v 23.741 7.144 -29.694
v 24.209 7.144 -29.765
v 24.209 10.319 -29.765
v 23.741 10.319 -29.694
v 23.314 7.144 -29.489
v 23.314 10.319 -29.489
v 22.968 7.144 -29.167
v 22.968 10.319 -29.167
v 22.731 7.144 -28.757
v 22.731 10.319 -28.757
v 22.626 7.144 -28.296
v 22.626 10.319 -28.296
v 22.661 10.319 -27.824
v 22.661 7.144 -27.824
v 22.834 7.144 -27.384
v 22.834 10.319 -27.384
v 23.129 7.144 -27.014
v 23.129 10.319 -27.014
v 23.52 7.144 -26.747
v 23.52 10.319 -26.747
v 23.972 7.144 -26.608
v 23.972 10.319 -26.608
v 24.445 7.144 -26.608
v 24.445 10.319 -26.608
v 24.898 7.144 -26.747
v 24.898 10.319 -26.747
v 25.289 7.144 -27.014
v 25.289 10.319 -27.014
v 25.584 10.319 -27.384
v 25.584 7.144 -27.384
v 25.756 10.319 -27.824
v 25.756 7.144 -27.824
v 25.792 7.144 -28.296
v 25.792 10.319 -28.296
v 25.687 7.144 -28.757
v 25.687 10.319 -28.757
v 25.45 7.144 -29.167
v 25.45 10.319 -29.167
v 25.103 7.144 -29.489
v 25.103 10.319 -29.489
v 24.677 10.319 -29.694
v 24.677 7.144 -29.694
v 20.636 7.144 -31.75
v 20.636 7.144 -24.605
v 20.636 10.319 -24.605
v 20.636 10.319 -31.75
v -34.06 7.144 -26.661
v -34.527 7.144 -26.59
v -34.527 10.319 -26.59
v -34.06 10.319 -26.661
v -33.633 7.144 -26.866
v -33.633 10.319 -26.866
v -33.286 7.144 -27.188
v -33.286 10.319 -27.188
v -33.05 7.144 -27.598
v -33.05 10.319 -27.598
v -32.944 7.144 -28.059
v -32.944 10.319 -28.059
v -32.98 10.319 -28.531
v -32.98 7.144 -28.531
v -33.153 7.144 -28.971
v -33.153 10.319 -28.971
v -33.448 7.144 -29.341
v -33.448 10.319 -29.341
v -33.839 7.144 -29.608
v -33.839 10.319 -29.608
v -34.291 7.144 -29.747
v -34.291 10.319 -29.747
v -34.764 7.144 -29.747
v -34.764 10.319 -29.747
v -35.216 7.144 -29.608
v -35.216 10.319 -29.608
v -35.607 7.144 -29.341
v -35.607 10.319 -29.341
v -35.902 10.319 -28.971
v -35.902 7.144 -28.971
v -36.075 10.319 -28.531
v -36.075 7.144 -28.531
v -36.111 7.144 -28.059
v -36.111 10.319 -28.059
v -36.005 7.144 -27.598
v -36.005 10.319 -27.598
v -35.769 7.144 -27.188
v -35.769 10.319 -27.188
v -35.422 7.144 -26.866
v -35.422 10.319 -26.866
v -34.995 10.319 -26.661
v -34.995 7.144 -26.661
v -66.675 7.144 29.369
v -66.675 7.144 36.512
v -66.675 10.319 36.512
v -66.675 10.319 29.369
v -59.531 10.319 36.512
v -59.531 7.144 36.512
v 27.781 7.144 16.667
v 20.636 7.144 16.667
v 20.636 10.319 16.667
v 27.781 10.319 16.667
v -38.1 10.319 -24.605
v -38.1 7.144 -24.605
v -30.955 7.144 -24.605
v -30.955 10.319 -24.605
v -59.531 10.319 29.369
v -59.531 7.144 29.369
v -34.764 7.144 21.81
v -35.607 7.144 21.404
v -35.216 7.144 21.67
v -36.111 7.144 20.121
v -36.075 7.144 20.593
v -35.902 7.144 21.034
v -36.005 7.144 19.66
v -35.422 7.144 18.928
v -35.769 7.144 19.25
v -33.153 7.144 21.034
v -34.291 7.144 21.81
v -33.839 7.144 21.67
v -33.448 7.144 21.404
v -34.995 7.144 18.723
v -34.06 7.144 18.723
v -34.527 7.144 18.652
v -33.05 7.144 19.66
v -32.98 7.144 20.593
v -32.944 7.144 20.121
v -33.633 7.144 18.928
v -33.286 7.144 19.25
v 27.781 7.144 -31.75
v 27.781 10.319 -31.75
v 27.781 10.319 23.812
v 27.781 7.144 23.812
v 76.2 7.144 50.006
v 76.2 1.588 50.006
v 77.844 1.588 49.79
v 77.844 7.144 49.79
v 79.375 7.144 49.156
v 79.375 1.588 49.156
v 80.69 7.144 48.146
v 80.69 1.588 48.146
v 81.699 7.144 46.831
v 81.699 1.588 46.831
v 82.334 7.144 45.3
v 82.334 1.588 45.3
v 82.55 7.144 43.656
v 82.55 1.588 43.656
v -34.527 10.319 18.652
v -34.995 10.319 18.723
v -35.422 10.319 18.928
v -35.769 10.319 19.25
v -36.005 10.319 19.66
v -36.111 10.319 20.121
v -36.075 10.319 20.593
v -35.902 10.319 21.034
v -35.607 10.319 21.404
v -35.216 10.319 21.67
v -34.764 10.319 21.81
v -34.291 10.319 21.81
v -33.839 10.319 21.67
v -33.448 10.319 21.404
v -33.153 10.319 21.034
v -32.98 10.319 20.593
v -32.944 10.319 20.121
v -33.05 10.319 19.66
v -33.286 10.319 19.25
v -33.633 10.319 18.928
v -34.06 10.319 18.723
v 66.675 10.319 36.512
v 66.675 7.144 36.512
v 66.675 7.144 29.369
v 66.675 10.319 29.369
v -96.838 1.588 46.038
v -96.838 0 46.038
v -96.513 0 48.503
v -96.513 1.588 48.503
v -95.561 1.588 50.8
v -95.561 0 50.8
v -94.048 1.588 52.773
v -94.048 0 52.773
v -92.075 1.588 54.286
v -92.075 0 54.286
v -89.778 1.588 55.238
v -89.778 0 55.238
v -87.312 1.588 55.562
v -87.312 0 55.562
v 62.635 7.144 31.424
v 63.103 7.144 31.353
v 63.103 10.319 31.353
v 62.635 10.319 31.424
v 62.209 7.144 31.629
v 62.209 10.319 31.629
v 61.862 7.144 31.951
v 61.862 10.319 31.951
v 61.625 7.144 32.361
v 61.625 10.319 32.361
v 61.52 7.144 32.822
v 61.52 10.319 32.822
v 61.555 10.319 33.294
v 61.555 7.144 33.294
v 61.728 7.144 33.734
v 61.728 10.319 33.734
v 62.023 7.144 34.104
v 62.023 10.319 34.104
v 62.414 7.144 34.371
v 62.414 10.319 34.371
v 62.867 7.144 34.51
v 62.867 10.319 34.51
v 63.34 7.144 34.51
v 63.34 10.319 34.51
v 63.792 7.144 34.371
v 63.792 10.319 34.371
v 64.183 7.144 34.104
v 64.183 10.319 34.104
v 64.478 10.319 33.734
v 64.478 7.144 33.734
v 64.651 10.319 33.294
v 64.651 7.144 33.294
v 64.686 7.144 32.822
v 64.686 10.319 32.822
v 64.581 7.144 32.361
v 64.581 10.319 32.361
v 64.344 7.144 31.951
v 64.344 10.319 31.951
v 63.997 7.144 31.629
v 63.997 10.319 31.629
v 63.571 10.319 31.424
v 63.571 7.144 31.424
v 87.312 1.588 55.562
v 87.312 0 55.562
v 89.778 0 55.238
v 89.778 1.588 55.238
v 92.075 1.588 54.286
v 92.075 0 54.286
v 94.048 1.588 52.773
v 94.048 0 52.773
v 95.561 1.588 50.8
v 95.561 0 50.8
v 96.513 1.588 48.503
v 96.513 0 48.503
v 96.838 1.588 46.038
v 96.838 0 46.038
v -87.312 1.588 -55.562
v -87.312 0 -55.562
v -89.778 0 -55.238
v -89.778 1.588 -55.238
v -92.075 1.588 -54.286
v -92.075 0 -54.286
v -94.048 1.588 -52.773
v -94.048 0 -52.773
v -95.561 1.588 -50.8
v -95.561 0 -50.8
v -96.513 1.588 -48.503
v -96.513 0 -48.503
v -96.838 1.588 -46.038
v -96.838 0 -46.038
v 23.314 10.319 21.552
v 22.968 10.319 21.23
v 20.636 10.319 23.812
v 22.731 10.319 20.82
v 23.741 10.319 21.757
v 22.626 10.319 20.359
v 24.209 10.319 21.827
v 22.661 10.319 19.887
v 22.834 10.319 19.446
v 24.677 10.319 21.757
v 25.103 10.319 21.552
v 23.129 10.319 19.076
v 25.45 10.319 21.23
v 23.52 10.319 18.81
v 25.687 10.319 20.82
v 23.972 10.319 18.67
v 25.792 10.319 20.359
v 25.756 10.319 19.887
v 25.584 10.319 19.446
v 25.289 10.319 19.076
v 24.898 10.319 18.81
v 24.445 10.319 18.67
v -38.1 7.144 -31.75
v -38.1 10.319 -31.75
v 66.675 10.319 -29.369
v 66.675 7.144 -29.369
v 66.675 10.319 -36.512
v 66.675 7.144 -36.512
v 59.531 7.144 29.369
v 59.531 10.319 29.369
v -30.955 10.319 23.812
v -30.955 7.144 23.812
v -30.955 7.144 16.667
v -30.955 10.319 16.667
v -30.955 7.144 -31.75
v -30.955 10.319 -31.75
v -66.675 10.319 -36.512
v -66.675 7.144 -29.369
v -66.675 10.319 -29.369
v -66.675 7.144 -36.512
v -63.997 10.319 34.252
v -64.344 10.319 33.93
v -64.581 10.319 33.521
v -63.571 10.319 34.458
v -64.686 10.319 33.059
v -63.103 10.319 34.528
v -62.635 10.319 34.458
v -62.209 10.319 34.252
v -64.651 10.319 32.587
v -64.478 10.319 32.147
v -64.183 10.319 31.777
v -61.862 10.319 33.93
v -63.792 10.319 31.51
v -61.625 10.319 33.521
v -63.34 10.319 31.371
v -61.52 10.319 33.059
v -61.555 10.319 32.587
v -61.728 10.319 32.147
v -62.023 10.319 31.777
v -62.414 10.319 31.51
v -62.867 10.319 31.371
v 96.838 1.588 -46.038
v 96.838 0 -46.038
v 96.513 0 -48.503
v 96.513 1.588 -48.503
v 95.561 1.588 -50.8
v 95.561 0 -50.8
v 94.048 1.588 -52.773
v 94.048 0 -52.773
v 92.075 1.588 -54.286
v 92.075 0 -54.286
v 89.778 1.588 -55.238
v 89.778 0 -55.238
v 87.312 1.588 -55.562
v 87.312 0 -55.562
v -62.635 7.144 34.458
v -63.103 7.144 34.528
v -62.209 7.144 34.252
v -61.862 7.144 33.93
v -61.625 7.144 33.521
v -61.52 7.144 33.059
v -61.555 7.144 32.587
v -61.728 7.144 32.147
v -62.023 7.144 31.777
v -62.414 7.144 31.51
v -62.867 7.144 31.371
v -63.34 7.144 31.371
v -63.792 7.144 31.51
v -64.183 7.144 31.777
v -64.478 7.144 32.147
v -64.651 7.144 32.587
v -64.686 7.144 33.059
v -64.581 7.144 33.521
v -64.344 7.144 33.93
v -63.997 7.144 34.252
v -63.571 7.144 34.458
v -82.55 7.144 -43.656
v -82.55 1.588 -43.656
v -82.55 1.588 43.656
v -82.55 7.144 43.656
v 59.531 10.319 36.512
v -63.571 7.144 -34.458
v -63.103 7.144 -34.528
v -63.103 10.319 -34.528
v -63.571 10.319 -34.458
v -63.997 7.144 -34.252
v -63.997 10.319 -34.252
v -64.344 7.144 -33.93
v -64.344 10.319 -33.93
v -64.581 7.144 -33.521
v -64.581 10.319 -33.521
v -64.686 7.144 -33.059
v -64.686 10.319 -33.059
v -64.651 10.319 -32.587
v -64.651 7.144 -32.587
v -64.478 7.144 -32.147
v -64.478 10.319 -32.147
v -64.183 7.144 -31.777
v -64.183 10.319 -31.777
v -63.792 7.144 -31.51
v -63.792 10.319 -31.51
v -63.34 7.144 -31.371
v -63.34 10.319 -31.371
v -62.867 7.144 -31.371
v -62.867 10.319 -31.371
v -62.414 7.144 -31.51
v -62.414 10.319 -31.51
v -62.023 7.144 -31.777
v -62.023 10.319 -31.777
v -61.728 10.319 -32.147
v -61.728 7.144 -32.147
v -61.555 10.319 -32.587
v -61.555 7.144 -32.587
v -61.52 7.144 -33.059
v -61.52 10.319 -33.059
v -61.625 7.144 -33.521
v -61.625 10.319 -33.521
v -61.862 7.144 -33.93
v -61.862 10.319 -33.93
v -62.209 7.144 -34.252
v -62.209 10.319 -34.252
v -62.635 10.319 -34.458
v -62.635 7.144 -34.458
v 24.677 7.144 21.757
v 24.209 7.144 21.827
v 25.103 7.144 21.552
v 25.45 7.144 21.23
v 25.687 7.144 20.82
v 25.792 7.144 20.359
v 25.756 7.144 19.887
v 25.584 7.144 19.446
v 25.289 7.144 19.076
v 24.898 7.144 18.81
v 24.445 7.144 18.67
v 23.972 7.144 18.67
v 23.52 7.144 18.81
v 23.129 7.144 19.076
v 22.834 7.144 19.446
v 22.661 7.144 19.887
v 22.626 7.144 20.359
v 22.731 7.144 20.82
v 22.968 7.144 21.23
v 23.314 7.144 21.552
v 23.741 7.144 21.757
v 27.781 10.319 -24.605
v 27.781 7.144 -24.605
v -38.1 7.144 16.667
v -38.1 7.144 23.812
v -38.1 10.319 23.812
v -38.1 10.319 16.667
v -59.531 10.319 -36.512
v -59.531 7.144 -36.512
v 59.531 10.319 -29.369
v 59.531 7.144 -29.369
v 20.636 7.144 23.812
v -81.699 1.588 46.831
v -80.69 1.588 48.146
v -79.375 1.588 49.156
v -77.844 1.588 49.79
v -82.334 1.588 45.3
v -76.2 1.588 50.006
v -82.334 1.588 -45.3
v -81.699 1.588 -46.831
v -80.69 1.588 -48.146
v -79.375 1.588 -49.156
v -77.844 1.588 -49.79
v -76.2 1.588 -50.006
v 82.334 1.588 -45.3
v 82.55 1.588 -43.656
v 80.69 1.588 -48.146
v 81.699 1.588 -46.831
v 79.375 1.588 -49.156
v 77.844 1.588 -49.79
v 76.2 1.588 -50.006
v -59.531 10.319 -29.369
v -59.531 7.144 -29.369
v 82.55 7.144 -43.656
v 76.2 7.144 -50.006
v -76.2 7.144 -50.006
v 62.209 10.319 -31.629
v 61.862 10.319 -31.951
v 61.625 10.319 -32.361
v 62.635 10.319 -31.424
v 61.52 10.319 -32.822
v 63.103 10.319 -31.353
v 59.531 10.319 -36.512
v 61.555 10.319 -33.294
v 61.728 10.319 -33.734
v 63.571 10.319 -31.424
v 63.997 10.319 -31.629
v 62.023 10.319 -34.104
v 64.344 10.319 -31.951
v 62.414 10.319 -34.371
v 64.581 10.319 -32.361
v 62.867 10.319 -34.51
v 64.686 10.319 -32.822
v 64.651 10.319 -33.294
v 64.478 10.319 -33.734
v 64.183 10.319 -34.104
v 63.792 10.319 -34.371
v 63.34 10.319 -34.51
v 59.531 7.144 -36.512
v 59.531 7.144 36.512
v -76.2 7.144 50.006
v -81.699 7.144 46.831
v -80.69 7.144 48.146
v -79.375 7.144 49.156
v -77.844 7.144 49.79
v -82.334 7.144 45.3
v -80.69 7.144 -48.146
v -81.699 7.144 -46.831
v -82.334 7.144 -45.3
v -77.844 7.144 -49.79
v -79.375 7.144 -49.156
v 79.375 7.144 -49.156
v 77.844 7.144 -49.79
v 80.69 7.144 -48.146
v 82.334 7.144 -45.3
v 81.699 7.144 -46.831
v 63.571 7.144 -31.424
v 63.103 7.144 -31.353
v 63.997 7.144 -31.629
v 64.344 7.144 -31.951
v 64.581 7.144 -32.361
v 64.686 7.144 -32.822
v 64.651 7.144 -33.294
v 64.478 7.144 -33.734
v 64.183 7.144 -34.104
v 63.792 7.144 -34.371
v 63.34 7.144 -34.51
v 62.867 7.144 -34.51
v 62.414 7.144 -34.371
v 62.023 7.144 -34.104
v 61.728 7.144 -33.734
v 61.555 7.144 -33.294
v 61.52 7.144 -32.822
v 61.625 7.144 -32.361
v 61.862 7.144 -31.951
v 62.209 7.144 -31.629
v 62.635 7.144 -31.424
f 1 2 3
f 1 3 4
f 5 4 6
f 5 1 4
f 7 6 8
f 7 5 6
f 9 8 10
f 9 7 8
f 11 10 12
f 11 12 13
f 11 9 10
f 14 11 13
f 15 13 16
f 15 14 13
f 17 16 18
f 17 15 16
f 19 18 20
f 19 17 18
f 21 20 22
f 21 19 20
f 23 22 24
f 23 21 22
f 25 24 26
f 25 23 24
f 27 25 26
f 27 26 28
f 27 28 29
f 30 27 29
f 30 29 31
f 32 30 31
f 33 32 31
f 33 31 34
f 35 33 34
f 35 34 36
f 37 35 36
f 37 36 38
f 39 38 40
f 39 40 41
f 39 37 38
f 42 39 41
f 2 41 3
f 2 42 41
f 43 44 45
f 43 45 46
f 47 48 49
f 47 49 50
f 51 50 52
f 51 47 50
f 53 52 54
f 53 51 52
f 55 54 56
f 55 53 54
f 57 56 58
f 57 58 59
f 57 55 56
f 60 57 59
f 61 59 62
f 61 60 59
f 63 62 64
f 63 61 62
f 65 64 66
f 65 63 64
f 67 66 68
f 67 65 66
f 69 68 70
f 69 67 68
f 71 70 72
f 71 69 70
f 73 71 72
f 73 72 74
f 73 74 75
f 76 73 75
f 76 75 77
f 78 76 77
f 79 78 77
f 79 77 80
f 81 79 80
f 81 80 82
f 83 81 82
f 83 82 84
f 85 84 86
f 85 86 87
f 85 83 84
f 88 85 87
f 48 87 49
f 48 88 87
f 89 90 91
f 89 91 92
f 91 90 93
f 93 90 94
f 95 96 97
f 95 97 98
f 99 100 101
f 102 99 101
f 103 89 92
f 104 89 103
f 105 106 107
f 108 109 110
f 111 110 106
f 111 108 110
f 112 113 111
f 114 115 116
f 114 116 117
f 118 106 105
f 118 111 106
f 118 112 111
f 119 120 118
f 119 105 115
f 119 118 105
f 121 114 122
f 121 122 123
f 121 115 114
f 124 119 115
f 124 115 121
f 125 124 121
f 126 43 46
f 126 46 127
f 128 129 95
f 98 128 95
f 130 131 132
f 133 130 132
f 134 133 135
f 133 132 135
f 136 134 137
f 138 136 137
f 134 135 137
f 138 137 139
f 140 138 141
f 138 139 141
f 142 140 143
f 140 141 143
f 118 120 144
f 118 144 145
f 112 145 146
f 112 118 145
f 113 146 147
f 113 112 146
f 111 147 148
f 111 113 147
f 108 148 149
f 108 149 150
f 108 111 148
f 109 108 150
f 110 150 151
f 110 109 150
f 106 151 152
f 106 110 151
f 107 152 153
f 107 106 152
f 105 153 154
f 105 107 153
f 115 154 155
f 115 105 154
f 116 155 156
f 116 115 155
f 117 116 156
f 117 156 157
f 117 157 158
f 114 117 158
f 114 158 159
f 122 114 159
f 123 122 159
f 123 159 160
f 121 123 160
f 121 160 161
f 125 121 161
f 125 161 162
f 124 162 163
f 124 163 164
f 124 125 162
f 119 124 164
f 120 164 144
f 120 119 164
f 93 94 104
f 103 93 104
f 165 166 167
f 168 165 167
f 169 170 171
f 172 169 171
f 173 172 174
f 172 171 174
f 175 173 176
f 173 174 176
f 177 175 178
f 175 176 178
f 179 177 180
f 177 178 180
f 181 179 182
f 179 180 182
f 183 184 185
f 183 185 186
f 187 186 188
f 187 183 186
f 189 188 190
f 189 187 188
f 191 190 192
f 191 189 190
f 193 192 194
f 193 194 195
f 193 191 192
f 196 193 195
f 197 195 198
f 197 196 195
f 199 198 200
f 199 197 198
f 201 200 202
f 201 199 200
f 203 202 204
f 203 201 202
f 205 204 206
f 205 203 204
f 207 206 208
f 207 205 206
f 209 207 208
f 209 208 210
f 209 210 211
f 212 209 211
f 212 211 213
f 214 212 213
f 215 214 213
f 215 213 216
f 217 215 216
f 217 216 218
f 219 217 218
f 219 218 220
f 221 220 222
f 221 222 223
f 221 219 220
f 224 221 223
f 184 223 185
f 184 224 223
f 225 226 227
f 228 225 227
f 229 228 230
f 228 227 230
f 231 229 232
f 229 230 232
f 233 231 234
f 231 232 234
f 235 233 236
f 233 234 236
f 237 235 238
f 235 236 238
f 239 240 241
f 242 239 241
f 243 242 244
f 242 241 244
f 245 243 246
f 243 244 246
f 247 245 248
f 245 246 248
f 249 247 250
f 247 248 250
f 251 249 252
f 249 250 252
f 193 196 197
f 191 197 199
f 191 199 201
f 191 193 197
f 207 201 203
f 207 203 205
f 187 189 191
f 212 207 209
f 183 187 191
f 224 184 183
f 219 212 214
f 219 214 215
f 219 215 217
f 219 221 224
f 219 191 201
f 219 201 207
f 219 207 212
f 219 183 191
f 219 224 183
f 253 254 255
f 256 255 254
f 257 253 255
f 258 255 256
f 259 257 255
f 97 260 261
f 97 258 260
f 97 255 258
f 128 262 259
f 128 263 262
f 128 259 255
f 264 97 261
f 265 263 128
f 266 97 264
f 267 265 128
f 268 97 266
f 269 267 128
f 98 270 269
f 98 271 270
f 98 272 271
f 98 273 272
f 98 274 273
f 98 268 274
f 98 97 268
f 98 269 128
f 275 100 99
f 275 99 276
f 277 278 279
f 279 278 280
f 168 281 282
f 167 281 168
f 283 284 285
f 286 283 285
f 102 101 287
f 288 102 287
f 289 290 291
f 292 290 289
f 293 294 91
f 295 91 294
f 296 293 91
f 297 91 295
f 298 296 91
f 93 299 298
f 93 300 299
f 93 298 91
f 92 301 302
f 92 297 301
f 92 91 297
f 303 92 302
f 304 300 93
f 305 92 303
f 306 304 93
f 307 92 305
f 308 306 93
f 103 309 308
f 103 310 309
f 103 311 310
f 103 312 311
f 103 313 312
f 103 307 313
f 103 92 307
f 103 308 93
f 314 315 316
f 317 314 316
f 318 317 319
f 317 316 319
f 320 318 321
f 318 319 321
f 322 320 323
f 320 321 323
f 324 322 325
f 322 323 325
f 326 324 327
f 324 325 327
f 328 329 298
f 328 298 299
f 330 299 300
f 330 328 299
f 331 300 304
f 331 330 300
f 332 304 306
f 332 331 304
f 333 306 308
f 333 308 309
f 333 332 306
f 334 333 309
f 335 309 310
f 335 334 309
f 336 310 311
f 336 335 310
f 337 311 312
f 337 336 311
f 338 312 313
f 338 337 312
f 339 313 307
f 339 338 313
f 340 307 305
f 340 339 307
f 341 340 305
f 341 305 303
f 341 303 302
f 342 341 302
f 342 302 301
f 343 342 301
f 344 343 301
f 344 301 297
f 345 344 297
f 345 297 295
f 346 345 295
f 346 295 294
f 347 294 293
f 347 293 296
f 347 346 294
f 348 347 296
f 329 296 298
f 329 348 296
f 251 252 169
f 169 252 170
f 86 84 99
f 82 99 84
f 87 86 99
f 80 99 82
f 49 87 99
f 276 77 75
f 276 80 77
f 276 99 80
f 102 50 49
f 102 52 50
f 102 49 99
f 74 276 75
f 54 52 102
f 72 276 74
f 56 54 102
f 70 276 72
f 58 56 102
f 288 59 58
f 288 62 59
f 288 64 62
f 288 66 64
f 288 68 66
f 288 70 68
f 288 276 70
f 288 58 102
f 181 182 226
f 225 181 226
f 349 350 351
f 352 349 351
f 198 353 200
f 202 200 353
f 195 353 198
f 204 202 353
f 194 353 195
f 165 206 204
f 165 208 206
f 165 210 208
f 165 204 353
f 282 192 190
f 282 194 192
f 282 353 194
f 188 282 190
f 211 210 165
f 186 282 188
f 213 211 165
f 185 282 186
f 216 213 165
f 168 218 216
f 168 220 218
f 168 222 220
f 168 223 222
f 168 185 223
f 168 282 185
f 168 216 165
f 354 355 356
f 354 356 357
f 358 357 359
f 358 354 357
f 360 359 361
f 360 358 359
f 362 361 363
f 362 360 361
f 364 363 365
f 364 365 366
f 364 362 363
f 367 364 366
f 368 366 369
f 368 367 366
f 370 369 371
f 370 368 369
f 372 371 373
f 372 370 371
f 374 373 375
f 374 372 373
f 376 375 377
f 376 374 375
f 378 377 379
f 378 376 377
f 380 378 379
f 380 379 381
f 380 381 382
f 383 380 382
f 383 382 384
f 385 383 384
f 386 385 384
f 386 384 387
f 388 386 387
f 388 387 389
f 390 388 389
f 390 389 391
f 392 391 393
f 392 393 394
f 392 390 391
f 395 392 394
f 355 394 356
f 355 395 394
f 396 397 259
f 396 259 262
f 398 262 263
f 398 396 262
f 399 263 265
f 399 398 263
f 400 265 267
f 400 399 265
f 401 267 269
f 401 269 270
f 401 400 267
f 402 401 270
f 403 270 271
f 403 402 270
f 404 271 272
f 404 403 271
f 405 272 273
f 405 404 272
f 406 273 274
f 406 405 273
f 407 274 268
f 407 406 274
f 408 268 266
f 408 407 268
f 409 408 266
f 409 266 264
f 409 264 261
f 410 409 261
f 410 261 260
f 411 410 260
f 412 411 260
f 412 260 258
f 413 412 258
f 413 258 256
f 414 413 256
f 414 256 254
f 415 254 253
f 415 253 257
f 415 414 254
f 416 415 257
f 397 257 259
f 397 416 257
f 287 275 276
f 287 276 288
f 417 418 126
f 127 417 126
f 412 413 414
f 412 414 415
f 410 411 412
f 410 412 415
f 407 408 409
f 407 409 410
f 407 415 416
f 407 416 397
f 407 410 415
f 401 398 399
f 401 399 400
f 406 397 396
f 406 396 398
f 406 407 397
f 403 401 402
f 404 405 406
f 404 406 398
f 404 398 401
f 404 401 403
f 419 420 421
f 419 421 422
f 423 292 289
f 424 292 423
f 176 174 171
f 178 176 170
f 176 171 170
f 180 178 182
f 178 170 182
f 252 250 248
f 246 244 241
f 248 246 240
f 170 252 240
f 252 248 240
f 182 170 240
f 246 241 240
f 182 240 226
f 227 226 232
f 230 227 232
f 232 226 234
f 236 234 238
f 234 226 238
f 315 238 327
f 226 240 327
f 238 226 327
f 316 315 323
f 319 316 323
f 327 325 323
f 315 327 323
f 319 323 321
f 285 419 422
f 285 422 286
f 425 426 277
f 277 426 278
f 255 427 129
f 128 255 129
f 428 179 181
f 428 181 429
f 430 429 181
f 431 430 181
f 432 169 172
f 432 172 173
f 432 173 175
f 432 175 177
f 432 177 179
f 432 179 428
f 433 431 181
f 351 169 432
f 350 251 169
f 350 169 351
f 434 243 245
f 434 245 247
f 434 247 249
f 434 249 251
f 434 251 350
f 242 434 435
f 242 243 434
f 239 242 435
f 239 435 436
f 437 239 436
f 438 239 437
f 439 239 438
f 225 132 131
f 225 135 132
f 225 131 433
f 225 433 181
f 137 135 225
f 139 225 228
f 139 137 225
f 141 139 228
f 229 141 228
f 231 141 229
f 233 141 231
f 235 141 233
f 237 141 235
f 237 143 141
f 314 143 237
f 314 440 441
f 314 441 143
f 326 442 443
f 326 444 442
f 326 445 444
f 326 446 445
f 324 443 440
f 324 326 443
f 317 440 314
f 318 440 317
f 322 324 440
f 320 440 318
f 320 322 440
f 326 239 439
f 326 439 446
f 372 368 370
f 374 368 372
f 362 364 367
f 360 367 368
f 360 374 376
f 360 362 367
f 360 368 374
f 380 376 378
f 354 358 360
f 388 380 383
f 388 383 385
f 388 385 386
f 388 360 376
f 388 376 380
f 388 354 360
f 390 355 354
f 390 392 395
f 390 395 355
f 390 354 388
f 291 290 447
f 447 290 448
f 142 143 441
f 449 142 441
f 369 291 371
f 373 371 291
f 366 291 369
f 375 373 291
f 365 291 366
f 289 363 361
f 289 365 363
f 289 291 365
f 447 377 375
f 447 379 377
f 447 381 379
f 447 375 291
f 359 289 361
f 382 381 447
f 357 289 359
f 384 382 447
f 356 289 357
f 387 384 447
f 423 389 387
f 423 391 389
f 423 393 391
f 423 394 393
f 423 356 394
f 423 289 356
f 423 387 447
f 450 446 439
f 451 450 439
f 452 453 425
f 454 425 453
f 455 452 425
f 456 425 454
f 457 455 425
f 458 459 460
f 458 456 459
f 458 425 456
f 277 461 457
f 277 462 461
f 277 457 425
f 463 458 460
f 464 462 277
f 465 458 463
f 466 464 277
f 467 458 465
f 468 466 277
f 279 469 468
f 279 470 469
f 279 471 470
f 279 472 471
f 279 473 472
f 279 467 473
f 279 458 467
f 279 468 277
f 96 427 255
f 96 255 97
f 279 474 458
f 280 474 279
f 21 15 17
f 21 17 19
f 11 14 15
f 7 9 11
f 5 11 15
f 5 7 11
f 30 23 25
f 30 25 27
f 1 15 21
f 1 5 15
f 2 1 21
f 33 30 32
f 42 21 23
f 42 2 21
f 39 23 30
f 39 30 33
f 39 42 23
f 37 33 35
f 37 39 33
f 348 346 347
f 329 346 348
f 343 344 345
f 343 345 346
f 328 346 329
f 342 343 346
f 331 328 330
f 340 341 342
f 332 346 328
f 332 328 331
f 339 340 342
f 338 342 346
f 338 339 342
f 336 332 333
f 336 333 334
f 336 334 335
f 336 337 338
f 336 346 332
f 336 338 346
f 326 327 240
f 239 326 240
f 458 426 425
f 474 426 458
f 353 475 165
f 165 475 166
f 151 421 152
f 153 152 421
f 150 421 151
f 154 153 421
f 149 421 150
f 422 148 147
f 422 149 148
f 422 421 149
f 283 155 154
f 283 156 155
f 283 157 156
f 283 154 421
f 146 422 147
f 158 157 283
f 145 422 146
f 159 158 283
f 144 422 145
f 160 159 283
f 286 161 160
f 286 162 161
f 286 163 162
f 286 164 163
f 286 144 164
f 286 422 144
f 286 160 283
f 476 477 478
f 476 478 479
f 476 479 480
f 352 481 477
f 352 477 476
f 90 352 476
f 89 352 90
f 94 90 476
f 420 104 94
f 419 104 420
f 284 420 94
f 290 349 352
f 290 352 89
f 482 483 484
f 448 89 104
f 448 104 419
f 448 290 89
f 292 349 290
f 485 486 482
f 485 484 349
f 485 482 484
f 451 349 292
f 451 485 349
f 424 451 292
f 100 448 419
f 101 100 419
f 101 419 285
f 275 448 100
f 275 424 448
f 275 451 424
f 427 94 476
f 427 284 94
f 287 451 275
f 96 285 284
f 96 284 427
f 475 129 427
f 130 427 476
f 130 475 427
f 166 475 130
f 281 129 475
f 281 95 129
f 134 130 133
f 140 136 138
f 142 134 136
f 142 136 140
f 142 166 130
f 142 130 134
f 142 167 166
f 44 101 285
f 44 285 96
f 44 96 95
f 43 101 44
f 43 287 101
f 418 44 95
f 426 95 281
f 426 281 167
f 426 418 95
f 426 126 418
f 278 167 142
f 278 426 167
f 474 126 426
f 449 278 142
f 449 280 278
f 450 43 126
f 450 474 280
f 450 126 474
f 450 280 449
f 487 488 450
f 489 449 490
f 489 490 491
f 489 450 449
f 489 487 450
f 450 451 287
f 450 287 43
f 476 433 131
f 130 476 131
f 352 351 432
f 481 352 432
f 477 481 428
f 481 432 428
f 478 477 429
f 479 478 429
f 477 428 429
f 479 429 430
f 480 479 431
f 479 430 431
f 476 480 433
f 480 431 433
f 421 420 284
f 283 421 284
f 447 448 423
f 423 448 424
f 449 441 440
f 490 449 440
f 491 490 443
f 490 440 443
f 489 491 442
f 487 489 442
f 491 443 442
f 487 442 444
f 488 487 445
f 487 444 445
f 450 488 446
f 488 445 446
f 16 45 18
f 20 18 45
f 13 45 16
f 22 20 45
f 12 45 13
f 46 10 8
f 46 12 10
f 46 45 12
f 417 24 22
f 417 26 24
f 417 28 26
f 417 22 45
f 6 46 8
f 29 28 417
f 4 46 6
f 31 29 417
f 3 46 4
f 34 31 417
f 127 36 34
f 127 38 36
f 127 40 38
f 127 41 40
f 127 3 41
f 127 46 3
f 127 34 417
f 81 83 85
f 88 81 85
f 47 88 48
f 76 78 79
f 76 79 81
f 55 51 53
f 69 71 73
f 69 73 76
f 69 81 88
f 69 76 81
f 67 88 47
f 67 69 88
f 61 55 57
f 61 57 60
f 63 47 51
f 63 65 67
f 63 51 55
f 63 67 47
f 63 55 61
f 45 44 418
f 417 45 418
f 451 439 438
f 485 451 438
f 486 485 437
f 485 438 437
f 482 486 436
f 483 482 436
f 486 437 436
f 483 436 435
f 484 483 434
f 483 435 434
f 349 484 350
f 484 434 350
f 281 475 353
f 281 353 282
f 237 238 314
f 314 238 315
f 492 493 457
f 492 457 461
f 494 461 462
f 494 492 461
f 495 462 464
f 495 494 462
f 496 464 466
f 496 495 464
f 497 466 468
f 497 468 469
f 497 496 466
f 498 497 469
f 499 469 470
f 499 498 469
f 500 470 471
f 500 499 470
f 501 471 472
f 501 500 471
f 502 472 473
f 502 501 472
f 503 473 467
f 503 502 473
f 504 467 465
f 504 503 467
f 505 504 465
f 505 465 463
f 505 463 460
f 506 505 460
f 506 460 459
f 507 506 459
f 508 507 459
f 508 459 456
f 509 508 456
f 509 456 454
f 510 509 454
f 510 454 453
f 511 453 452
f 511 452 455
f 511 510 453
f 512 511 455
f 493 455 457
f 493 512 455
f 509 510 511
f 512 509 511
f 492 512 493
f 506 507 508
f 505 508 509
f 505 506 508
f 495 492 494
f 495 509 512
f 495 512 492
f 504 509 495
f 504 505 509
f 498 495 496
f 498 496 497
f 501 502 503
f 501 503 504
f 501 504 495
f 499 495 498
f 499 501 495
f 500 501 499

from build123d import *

# Parameters (mm, degrees)
BOSS_EXTRUDE1_DEPTH = 1.5875
BOSS_EXTRUDE2_DEPTH = 5.55625
SKETCH3_W           = 7.14375
SKETCH3_H           = 7.14375
SKETCH3_R           = 1.5875
BOSS_EXTRUDE3_DEPTH = 3.175
SKETCH4_W           = 7.14502
SKETCH4_H           = 7.14502
SKETCH4_R           = 1.5875
BOSS_EXTRUDE4_DEPTH = 3.175


with BuildPart() as part:
    # Sketch1 → Boss-Extrude1 (new body)
    with BuildSketch(Plane(origin=(0, 0, 0), x_dir=(1, 0, 0), z_dir=(0, 1, 0))):
        with BuildLine():
            Line((87.3125, 55.5625), (-87.3125, 55.5625))
            ThreePointArc((-87.3125, 55.5625), (-94.047692091, 52.772692091), (-96.8375, 46.0375))
            Line((-96.8375, 46.0375), (-96.8375, -46.0375))
            ThreePointArc((-96.8375, -46.0375), (-94.047692091, -52.772692091), (-87.3125, -55.5625))
            Line((-87.3125, -55.5625), (87.3125, -55.5625))
            ThreePointArc((87.3125, -55.5625), (94.047692091, -52.772692091), (96.8375, -46.0375))
            Line((96.8375, -46.0375), (96.8375, 46.0375))
            ThreePointArc((96.8375, 46.0375), (94.047692091, 52.772692091), (87.3125, 55.5625))
        make_face()
    extrude(amount=BOSS_EXTRUDE1_DEPTH)

    # Sketch2 → Boss-Extrude2 (add)
    with BuildSketch(Plane(origin=(0, 1.5875, 0), x_dir=(1, 0, 0), z_dir=(0, 1, 0))):
        with BuildLine():
            Line((76.2, 50.00625), (-76.2, 50.00625))
            ThreePointArc((-76.2, 50.00625), (-80.690128061, 48.146378061), (-82.55, 43.65625))
            Line((-82.55, 43.65625), (-82.55, -43.65625))
            ThreePointArc((-82.55, -43.65625), (-80.690128061, -48.146378061), (-76.2, -50.00625))
            Line((-76.2, -50.00625), (76.2, -50.00625))
            ThreePointArc((76.2, -50.00625), (80.690128061, -48.146378061), (82.55, -43.65625))
            Line((82.55, -43.65625), (82.55, 43.65625))
            ThreePointArc((82.55, 43.65625), (80.690128061, 48.146378061), (76.2, 50.00625))
        make_face()
    extrude(amount=BOSS_EXTRUDE2_DEPTH)

    # Sketch3 → Boss-Extrude3 (add)
    # profile 1 of 4: a face of its own
    with BuildSketch(Plane(origin=(0, 7.14375, 0), x_dir=(1, 0, 0), z_dir=(0, 1, 0))):
        with Locations((-63.103125, -32.940625)):
            Rectangle(SKETCH3_W, SKETCH3_H)
        with Locations(Location((-63.103125, -32.940625, 0), (0, 0, 270))):
            Circle(SKETCH3_R, mode=Mode.SUBTRACT)
    # profile 2 of 4: a face of its own
    with BuildSketch(Plane(origin=(0, 7.14375, 0), x_dir=(1, 0, 0), z_dir=(0, 1, 0))):
        with Locations((63.103125, -32.940625)):
            Rectangle(SKETCH3_W, SKETCH3_H)
        with Locations(Location((63.103125, -32.940625, 0), (0, 0, 90))):
            Circle(SKETCH3_R, mode=Mode.SUBTRACT)
    # profile 3 of 4: a face of its own
    with BuildSketch(Plane(origin=(0, 7.14375, 0), x_dir=(1, 0, 0), z_dir=(0, 1, 0))):
        with Locations((63.103125, 32.940625)):
            Rectangle(SKETCH3_W, SKETCH3_H)
        with Locations(Location((63.103125, 32.940625, 0), (0, 0, 270))):
            Circle(SKETCH3_R, mode=Mode.SUBTRACT)
    # profile 4 of 4: a face of its own
    with BuildSketch(Plane(origin=(0, 7.14375, 0), x_dir=(1, 0, 0), z_dir=(0, 1, 0))):
        with Locations((-63.103125, 32.940625)):
            Rectangle(SKETCH3_W, SKETCH3_H)
        with Locations(Location((-63.103125, 32.940625, 0), (0, 0, 90))):
            Circle(SKETCH3_R, mode=Mode.SUBTRACT)
    extrude(amount=BOSS_EXTRUDE3_DEPTH)

    # Sketch4 → Boss-Extrude4 (add)
    # profile 1 of 4: a face of its own
    with BuildSketch(Plane(origin=(0, 7.14375, 0), x_dir=(1, 0, 0), z_dir=(0, 1, 0))):
        with Locations((24.20874, -20.23999)):
            Rectangle(SKETCH4_W, SKETCH4_H)
        with Locations(Location((24.20874, -20.23999, 0), (0, 0, 270))):
            Circle(SKETCH4_R, mode=Mode.SUBTRACT)
    # profile 2 of 4: a face of its own
    with BuildSketch(Plane(origin=(0, 7.14375, 0), x_dir=(1, 0, 0), z_dir=(0, 1, 0))):
        with Locations((-34.52749, -20.23999)):
            Rectangle(SKETCH4_W, SKETCH4_H)
        with Locations(Location((-34.52749, -20.23999, 0), (0, 0, 90))):
            Circle(SKETCH4_R, mode=Mode.SUBTRACT)
    # profile 3 of 4: a face of its own
    with BuildSketch(Plane(origin=(0, 7.14375, 0), x_dir=(1, 0, 0), z_dir=(0, 1, 0))):
        with Locations((-34.52749, 28.17749)):
            Rectangle(SKETCH4_W, SKETCH4_H)
        with Locations(Location((-34.52749, 28.17749, 0), (0, 0, 270))):
            Circle(SKETCH4_R, mode=Mode.SUBTRACT)
    # profile 4 of 4: a face of its own
    with BuildSketch(Plane(origin=(0, 7.14375, 0), x_dir=(1, 0, 0), z_dir=(0, 1, 0))):
        with Locations((24.20874, 28.17749)):
            Rectangle(SKETCH4_W, SKETCH4_H)
        with Locations(Location((24.20874, 28.17749, 0), (0, 0, 90))):
            Circle(SKETCH4_R, mode=Mode.SUBTRACT)
    extrude(amount=BOSS_EXTRUDE4_DEPTH)


solid = part.part
